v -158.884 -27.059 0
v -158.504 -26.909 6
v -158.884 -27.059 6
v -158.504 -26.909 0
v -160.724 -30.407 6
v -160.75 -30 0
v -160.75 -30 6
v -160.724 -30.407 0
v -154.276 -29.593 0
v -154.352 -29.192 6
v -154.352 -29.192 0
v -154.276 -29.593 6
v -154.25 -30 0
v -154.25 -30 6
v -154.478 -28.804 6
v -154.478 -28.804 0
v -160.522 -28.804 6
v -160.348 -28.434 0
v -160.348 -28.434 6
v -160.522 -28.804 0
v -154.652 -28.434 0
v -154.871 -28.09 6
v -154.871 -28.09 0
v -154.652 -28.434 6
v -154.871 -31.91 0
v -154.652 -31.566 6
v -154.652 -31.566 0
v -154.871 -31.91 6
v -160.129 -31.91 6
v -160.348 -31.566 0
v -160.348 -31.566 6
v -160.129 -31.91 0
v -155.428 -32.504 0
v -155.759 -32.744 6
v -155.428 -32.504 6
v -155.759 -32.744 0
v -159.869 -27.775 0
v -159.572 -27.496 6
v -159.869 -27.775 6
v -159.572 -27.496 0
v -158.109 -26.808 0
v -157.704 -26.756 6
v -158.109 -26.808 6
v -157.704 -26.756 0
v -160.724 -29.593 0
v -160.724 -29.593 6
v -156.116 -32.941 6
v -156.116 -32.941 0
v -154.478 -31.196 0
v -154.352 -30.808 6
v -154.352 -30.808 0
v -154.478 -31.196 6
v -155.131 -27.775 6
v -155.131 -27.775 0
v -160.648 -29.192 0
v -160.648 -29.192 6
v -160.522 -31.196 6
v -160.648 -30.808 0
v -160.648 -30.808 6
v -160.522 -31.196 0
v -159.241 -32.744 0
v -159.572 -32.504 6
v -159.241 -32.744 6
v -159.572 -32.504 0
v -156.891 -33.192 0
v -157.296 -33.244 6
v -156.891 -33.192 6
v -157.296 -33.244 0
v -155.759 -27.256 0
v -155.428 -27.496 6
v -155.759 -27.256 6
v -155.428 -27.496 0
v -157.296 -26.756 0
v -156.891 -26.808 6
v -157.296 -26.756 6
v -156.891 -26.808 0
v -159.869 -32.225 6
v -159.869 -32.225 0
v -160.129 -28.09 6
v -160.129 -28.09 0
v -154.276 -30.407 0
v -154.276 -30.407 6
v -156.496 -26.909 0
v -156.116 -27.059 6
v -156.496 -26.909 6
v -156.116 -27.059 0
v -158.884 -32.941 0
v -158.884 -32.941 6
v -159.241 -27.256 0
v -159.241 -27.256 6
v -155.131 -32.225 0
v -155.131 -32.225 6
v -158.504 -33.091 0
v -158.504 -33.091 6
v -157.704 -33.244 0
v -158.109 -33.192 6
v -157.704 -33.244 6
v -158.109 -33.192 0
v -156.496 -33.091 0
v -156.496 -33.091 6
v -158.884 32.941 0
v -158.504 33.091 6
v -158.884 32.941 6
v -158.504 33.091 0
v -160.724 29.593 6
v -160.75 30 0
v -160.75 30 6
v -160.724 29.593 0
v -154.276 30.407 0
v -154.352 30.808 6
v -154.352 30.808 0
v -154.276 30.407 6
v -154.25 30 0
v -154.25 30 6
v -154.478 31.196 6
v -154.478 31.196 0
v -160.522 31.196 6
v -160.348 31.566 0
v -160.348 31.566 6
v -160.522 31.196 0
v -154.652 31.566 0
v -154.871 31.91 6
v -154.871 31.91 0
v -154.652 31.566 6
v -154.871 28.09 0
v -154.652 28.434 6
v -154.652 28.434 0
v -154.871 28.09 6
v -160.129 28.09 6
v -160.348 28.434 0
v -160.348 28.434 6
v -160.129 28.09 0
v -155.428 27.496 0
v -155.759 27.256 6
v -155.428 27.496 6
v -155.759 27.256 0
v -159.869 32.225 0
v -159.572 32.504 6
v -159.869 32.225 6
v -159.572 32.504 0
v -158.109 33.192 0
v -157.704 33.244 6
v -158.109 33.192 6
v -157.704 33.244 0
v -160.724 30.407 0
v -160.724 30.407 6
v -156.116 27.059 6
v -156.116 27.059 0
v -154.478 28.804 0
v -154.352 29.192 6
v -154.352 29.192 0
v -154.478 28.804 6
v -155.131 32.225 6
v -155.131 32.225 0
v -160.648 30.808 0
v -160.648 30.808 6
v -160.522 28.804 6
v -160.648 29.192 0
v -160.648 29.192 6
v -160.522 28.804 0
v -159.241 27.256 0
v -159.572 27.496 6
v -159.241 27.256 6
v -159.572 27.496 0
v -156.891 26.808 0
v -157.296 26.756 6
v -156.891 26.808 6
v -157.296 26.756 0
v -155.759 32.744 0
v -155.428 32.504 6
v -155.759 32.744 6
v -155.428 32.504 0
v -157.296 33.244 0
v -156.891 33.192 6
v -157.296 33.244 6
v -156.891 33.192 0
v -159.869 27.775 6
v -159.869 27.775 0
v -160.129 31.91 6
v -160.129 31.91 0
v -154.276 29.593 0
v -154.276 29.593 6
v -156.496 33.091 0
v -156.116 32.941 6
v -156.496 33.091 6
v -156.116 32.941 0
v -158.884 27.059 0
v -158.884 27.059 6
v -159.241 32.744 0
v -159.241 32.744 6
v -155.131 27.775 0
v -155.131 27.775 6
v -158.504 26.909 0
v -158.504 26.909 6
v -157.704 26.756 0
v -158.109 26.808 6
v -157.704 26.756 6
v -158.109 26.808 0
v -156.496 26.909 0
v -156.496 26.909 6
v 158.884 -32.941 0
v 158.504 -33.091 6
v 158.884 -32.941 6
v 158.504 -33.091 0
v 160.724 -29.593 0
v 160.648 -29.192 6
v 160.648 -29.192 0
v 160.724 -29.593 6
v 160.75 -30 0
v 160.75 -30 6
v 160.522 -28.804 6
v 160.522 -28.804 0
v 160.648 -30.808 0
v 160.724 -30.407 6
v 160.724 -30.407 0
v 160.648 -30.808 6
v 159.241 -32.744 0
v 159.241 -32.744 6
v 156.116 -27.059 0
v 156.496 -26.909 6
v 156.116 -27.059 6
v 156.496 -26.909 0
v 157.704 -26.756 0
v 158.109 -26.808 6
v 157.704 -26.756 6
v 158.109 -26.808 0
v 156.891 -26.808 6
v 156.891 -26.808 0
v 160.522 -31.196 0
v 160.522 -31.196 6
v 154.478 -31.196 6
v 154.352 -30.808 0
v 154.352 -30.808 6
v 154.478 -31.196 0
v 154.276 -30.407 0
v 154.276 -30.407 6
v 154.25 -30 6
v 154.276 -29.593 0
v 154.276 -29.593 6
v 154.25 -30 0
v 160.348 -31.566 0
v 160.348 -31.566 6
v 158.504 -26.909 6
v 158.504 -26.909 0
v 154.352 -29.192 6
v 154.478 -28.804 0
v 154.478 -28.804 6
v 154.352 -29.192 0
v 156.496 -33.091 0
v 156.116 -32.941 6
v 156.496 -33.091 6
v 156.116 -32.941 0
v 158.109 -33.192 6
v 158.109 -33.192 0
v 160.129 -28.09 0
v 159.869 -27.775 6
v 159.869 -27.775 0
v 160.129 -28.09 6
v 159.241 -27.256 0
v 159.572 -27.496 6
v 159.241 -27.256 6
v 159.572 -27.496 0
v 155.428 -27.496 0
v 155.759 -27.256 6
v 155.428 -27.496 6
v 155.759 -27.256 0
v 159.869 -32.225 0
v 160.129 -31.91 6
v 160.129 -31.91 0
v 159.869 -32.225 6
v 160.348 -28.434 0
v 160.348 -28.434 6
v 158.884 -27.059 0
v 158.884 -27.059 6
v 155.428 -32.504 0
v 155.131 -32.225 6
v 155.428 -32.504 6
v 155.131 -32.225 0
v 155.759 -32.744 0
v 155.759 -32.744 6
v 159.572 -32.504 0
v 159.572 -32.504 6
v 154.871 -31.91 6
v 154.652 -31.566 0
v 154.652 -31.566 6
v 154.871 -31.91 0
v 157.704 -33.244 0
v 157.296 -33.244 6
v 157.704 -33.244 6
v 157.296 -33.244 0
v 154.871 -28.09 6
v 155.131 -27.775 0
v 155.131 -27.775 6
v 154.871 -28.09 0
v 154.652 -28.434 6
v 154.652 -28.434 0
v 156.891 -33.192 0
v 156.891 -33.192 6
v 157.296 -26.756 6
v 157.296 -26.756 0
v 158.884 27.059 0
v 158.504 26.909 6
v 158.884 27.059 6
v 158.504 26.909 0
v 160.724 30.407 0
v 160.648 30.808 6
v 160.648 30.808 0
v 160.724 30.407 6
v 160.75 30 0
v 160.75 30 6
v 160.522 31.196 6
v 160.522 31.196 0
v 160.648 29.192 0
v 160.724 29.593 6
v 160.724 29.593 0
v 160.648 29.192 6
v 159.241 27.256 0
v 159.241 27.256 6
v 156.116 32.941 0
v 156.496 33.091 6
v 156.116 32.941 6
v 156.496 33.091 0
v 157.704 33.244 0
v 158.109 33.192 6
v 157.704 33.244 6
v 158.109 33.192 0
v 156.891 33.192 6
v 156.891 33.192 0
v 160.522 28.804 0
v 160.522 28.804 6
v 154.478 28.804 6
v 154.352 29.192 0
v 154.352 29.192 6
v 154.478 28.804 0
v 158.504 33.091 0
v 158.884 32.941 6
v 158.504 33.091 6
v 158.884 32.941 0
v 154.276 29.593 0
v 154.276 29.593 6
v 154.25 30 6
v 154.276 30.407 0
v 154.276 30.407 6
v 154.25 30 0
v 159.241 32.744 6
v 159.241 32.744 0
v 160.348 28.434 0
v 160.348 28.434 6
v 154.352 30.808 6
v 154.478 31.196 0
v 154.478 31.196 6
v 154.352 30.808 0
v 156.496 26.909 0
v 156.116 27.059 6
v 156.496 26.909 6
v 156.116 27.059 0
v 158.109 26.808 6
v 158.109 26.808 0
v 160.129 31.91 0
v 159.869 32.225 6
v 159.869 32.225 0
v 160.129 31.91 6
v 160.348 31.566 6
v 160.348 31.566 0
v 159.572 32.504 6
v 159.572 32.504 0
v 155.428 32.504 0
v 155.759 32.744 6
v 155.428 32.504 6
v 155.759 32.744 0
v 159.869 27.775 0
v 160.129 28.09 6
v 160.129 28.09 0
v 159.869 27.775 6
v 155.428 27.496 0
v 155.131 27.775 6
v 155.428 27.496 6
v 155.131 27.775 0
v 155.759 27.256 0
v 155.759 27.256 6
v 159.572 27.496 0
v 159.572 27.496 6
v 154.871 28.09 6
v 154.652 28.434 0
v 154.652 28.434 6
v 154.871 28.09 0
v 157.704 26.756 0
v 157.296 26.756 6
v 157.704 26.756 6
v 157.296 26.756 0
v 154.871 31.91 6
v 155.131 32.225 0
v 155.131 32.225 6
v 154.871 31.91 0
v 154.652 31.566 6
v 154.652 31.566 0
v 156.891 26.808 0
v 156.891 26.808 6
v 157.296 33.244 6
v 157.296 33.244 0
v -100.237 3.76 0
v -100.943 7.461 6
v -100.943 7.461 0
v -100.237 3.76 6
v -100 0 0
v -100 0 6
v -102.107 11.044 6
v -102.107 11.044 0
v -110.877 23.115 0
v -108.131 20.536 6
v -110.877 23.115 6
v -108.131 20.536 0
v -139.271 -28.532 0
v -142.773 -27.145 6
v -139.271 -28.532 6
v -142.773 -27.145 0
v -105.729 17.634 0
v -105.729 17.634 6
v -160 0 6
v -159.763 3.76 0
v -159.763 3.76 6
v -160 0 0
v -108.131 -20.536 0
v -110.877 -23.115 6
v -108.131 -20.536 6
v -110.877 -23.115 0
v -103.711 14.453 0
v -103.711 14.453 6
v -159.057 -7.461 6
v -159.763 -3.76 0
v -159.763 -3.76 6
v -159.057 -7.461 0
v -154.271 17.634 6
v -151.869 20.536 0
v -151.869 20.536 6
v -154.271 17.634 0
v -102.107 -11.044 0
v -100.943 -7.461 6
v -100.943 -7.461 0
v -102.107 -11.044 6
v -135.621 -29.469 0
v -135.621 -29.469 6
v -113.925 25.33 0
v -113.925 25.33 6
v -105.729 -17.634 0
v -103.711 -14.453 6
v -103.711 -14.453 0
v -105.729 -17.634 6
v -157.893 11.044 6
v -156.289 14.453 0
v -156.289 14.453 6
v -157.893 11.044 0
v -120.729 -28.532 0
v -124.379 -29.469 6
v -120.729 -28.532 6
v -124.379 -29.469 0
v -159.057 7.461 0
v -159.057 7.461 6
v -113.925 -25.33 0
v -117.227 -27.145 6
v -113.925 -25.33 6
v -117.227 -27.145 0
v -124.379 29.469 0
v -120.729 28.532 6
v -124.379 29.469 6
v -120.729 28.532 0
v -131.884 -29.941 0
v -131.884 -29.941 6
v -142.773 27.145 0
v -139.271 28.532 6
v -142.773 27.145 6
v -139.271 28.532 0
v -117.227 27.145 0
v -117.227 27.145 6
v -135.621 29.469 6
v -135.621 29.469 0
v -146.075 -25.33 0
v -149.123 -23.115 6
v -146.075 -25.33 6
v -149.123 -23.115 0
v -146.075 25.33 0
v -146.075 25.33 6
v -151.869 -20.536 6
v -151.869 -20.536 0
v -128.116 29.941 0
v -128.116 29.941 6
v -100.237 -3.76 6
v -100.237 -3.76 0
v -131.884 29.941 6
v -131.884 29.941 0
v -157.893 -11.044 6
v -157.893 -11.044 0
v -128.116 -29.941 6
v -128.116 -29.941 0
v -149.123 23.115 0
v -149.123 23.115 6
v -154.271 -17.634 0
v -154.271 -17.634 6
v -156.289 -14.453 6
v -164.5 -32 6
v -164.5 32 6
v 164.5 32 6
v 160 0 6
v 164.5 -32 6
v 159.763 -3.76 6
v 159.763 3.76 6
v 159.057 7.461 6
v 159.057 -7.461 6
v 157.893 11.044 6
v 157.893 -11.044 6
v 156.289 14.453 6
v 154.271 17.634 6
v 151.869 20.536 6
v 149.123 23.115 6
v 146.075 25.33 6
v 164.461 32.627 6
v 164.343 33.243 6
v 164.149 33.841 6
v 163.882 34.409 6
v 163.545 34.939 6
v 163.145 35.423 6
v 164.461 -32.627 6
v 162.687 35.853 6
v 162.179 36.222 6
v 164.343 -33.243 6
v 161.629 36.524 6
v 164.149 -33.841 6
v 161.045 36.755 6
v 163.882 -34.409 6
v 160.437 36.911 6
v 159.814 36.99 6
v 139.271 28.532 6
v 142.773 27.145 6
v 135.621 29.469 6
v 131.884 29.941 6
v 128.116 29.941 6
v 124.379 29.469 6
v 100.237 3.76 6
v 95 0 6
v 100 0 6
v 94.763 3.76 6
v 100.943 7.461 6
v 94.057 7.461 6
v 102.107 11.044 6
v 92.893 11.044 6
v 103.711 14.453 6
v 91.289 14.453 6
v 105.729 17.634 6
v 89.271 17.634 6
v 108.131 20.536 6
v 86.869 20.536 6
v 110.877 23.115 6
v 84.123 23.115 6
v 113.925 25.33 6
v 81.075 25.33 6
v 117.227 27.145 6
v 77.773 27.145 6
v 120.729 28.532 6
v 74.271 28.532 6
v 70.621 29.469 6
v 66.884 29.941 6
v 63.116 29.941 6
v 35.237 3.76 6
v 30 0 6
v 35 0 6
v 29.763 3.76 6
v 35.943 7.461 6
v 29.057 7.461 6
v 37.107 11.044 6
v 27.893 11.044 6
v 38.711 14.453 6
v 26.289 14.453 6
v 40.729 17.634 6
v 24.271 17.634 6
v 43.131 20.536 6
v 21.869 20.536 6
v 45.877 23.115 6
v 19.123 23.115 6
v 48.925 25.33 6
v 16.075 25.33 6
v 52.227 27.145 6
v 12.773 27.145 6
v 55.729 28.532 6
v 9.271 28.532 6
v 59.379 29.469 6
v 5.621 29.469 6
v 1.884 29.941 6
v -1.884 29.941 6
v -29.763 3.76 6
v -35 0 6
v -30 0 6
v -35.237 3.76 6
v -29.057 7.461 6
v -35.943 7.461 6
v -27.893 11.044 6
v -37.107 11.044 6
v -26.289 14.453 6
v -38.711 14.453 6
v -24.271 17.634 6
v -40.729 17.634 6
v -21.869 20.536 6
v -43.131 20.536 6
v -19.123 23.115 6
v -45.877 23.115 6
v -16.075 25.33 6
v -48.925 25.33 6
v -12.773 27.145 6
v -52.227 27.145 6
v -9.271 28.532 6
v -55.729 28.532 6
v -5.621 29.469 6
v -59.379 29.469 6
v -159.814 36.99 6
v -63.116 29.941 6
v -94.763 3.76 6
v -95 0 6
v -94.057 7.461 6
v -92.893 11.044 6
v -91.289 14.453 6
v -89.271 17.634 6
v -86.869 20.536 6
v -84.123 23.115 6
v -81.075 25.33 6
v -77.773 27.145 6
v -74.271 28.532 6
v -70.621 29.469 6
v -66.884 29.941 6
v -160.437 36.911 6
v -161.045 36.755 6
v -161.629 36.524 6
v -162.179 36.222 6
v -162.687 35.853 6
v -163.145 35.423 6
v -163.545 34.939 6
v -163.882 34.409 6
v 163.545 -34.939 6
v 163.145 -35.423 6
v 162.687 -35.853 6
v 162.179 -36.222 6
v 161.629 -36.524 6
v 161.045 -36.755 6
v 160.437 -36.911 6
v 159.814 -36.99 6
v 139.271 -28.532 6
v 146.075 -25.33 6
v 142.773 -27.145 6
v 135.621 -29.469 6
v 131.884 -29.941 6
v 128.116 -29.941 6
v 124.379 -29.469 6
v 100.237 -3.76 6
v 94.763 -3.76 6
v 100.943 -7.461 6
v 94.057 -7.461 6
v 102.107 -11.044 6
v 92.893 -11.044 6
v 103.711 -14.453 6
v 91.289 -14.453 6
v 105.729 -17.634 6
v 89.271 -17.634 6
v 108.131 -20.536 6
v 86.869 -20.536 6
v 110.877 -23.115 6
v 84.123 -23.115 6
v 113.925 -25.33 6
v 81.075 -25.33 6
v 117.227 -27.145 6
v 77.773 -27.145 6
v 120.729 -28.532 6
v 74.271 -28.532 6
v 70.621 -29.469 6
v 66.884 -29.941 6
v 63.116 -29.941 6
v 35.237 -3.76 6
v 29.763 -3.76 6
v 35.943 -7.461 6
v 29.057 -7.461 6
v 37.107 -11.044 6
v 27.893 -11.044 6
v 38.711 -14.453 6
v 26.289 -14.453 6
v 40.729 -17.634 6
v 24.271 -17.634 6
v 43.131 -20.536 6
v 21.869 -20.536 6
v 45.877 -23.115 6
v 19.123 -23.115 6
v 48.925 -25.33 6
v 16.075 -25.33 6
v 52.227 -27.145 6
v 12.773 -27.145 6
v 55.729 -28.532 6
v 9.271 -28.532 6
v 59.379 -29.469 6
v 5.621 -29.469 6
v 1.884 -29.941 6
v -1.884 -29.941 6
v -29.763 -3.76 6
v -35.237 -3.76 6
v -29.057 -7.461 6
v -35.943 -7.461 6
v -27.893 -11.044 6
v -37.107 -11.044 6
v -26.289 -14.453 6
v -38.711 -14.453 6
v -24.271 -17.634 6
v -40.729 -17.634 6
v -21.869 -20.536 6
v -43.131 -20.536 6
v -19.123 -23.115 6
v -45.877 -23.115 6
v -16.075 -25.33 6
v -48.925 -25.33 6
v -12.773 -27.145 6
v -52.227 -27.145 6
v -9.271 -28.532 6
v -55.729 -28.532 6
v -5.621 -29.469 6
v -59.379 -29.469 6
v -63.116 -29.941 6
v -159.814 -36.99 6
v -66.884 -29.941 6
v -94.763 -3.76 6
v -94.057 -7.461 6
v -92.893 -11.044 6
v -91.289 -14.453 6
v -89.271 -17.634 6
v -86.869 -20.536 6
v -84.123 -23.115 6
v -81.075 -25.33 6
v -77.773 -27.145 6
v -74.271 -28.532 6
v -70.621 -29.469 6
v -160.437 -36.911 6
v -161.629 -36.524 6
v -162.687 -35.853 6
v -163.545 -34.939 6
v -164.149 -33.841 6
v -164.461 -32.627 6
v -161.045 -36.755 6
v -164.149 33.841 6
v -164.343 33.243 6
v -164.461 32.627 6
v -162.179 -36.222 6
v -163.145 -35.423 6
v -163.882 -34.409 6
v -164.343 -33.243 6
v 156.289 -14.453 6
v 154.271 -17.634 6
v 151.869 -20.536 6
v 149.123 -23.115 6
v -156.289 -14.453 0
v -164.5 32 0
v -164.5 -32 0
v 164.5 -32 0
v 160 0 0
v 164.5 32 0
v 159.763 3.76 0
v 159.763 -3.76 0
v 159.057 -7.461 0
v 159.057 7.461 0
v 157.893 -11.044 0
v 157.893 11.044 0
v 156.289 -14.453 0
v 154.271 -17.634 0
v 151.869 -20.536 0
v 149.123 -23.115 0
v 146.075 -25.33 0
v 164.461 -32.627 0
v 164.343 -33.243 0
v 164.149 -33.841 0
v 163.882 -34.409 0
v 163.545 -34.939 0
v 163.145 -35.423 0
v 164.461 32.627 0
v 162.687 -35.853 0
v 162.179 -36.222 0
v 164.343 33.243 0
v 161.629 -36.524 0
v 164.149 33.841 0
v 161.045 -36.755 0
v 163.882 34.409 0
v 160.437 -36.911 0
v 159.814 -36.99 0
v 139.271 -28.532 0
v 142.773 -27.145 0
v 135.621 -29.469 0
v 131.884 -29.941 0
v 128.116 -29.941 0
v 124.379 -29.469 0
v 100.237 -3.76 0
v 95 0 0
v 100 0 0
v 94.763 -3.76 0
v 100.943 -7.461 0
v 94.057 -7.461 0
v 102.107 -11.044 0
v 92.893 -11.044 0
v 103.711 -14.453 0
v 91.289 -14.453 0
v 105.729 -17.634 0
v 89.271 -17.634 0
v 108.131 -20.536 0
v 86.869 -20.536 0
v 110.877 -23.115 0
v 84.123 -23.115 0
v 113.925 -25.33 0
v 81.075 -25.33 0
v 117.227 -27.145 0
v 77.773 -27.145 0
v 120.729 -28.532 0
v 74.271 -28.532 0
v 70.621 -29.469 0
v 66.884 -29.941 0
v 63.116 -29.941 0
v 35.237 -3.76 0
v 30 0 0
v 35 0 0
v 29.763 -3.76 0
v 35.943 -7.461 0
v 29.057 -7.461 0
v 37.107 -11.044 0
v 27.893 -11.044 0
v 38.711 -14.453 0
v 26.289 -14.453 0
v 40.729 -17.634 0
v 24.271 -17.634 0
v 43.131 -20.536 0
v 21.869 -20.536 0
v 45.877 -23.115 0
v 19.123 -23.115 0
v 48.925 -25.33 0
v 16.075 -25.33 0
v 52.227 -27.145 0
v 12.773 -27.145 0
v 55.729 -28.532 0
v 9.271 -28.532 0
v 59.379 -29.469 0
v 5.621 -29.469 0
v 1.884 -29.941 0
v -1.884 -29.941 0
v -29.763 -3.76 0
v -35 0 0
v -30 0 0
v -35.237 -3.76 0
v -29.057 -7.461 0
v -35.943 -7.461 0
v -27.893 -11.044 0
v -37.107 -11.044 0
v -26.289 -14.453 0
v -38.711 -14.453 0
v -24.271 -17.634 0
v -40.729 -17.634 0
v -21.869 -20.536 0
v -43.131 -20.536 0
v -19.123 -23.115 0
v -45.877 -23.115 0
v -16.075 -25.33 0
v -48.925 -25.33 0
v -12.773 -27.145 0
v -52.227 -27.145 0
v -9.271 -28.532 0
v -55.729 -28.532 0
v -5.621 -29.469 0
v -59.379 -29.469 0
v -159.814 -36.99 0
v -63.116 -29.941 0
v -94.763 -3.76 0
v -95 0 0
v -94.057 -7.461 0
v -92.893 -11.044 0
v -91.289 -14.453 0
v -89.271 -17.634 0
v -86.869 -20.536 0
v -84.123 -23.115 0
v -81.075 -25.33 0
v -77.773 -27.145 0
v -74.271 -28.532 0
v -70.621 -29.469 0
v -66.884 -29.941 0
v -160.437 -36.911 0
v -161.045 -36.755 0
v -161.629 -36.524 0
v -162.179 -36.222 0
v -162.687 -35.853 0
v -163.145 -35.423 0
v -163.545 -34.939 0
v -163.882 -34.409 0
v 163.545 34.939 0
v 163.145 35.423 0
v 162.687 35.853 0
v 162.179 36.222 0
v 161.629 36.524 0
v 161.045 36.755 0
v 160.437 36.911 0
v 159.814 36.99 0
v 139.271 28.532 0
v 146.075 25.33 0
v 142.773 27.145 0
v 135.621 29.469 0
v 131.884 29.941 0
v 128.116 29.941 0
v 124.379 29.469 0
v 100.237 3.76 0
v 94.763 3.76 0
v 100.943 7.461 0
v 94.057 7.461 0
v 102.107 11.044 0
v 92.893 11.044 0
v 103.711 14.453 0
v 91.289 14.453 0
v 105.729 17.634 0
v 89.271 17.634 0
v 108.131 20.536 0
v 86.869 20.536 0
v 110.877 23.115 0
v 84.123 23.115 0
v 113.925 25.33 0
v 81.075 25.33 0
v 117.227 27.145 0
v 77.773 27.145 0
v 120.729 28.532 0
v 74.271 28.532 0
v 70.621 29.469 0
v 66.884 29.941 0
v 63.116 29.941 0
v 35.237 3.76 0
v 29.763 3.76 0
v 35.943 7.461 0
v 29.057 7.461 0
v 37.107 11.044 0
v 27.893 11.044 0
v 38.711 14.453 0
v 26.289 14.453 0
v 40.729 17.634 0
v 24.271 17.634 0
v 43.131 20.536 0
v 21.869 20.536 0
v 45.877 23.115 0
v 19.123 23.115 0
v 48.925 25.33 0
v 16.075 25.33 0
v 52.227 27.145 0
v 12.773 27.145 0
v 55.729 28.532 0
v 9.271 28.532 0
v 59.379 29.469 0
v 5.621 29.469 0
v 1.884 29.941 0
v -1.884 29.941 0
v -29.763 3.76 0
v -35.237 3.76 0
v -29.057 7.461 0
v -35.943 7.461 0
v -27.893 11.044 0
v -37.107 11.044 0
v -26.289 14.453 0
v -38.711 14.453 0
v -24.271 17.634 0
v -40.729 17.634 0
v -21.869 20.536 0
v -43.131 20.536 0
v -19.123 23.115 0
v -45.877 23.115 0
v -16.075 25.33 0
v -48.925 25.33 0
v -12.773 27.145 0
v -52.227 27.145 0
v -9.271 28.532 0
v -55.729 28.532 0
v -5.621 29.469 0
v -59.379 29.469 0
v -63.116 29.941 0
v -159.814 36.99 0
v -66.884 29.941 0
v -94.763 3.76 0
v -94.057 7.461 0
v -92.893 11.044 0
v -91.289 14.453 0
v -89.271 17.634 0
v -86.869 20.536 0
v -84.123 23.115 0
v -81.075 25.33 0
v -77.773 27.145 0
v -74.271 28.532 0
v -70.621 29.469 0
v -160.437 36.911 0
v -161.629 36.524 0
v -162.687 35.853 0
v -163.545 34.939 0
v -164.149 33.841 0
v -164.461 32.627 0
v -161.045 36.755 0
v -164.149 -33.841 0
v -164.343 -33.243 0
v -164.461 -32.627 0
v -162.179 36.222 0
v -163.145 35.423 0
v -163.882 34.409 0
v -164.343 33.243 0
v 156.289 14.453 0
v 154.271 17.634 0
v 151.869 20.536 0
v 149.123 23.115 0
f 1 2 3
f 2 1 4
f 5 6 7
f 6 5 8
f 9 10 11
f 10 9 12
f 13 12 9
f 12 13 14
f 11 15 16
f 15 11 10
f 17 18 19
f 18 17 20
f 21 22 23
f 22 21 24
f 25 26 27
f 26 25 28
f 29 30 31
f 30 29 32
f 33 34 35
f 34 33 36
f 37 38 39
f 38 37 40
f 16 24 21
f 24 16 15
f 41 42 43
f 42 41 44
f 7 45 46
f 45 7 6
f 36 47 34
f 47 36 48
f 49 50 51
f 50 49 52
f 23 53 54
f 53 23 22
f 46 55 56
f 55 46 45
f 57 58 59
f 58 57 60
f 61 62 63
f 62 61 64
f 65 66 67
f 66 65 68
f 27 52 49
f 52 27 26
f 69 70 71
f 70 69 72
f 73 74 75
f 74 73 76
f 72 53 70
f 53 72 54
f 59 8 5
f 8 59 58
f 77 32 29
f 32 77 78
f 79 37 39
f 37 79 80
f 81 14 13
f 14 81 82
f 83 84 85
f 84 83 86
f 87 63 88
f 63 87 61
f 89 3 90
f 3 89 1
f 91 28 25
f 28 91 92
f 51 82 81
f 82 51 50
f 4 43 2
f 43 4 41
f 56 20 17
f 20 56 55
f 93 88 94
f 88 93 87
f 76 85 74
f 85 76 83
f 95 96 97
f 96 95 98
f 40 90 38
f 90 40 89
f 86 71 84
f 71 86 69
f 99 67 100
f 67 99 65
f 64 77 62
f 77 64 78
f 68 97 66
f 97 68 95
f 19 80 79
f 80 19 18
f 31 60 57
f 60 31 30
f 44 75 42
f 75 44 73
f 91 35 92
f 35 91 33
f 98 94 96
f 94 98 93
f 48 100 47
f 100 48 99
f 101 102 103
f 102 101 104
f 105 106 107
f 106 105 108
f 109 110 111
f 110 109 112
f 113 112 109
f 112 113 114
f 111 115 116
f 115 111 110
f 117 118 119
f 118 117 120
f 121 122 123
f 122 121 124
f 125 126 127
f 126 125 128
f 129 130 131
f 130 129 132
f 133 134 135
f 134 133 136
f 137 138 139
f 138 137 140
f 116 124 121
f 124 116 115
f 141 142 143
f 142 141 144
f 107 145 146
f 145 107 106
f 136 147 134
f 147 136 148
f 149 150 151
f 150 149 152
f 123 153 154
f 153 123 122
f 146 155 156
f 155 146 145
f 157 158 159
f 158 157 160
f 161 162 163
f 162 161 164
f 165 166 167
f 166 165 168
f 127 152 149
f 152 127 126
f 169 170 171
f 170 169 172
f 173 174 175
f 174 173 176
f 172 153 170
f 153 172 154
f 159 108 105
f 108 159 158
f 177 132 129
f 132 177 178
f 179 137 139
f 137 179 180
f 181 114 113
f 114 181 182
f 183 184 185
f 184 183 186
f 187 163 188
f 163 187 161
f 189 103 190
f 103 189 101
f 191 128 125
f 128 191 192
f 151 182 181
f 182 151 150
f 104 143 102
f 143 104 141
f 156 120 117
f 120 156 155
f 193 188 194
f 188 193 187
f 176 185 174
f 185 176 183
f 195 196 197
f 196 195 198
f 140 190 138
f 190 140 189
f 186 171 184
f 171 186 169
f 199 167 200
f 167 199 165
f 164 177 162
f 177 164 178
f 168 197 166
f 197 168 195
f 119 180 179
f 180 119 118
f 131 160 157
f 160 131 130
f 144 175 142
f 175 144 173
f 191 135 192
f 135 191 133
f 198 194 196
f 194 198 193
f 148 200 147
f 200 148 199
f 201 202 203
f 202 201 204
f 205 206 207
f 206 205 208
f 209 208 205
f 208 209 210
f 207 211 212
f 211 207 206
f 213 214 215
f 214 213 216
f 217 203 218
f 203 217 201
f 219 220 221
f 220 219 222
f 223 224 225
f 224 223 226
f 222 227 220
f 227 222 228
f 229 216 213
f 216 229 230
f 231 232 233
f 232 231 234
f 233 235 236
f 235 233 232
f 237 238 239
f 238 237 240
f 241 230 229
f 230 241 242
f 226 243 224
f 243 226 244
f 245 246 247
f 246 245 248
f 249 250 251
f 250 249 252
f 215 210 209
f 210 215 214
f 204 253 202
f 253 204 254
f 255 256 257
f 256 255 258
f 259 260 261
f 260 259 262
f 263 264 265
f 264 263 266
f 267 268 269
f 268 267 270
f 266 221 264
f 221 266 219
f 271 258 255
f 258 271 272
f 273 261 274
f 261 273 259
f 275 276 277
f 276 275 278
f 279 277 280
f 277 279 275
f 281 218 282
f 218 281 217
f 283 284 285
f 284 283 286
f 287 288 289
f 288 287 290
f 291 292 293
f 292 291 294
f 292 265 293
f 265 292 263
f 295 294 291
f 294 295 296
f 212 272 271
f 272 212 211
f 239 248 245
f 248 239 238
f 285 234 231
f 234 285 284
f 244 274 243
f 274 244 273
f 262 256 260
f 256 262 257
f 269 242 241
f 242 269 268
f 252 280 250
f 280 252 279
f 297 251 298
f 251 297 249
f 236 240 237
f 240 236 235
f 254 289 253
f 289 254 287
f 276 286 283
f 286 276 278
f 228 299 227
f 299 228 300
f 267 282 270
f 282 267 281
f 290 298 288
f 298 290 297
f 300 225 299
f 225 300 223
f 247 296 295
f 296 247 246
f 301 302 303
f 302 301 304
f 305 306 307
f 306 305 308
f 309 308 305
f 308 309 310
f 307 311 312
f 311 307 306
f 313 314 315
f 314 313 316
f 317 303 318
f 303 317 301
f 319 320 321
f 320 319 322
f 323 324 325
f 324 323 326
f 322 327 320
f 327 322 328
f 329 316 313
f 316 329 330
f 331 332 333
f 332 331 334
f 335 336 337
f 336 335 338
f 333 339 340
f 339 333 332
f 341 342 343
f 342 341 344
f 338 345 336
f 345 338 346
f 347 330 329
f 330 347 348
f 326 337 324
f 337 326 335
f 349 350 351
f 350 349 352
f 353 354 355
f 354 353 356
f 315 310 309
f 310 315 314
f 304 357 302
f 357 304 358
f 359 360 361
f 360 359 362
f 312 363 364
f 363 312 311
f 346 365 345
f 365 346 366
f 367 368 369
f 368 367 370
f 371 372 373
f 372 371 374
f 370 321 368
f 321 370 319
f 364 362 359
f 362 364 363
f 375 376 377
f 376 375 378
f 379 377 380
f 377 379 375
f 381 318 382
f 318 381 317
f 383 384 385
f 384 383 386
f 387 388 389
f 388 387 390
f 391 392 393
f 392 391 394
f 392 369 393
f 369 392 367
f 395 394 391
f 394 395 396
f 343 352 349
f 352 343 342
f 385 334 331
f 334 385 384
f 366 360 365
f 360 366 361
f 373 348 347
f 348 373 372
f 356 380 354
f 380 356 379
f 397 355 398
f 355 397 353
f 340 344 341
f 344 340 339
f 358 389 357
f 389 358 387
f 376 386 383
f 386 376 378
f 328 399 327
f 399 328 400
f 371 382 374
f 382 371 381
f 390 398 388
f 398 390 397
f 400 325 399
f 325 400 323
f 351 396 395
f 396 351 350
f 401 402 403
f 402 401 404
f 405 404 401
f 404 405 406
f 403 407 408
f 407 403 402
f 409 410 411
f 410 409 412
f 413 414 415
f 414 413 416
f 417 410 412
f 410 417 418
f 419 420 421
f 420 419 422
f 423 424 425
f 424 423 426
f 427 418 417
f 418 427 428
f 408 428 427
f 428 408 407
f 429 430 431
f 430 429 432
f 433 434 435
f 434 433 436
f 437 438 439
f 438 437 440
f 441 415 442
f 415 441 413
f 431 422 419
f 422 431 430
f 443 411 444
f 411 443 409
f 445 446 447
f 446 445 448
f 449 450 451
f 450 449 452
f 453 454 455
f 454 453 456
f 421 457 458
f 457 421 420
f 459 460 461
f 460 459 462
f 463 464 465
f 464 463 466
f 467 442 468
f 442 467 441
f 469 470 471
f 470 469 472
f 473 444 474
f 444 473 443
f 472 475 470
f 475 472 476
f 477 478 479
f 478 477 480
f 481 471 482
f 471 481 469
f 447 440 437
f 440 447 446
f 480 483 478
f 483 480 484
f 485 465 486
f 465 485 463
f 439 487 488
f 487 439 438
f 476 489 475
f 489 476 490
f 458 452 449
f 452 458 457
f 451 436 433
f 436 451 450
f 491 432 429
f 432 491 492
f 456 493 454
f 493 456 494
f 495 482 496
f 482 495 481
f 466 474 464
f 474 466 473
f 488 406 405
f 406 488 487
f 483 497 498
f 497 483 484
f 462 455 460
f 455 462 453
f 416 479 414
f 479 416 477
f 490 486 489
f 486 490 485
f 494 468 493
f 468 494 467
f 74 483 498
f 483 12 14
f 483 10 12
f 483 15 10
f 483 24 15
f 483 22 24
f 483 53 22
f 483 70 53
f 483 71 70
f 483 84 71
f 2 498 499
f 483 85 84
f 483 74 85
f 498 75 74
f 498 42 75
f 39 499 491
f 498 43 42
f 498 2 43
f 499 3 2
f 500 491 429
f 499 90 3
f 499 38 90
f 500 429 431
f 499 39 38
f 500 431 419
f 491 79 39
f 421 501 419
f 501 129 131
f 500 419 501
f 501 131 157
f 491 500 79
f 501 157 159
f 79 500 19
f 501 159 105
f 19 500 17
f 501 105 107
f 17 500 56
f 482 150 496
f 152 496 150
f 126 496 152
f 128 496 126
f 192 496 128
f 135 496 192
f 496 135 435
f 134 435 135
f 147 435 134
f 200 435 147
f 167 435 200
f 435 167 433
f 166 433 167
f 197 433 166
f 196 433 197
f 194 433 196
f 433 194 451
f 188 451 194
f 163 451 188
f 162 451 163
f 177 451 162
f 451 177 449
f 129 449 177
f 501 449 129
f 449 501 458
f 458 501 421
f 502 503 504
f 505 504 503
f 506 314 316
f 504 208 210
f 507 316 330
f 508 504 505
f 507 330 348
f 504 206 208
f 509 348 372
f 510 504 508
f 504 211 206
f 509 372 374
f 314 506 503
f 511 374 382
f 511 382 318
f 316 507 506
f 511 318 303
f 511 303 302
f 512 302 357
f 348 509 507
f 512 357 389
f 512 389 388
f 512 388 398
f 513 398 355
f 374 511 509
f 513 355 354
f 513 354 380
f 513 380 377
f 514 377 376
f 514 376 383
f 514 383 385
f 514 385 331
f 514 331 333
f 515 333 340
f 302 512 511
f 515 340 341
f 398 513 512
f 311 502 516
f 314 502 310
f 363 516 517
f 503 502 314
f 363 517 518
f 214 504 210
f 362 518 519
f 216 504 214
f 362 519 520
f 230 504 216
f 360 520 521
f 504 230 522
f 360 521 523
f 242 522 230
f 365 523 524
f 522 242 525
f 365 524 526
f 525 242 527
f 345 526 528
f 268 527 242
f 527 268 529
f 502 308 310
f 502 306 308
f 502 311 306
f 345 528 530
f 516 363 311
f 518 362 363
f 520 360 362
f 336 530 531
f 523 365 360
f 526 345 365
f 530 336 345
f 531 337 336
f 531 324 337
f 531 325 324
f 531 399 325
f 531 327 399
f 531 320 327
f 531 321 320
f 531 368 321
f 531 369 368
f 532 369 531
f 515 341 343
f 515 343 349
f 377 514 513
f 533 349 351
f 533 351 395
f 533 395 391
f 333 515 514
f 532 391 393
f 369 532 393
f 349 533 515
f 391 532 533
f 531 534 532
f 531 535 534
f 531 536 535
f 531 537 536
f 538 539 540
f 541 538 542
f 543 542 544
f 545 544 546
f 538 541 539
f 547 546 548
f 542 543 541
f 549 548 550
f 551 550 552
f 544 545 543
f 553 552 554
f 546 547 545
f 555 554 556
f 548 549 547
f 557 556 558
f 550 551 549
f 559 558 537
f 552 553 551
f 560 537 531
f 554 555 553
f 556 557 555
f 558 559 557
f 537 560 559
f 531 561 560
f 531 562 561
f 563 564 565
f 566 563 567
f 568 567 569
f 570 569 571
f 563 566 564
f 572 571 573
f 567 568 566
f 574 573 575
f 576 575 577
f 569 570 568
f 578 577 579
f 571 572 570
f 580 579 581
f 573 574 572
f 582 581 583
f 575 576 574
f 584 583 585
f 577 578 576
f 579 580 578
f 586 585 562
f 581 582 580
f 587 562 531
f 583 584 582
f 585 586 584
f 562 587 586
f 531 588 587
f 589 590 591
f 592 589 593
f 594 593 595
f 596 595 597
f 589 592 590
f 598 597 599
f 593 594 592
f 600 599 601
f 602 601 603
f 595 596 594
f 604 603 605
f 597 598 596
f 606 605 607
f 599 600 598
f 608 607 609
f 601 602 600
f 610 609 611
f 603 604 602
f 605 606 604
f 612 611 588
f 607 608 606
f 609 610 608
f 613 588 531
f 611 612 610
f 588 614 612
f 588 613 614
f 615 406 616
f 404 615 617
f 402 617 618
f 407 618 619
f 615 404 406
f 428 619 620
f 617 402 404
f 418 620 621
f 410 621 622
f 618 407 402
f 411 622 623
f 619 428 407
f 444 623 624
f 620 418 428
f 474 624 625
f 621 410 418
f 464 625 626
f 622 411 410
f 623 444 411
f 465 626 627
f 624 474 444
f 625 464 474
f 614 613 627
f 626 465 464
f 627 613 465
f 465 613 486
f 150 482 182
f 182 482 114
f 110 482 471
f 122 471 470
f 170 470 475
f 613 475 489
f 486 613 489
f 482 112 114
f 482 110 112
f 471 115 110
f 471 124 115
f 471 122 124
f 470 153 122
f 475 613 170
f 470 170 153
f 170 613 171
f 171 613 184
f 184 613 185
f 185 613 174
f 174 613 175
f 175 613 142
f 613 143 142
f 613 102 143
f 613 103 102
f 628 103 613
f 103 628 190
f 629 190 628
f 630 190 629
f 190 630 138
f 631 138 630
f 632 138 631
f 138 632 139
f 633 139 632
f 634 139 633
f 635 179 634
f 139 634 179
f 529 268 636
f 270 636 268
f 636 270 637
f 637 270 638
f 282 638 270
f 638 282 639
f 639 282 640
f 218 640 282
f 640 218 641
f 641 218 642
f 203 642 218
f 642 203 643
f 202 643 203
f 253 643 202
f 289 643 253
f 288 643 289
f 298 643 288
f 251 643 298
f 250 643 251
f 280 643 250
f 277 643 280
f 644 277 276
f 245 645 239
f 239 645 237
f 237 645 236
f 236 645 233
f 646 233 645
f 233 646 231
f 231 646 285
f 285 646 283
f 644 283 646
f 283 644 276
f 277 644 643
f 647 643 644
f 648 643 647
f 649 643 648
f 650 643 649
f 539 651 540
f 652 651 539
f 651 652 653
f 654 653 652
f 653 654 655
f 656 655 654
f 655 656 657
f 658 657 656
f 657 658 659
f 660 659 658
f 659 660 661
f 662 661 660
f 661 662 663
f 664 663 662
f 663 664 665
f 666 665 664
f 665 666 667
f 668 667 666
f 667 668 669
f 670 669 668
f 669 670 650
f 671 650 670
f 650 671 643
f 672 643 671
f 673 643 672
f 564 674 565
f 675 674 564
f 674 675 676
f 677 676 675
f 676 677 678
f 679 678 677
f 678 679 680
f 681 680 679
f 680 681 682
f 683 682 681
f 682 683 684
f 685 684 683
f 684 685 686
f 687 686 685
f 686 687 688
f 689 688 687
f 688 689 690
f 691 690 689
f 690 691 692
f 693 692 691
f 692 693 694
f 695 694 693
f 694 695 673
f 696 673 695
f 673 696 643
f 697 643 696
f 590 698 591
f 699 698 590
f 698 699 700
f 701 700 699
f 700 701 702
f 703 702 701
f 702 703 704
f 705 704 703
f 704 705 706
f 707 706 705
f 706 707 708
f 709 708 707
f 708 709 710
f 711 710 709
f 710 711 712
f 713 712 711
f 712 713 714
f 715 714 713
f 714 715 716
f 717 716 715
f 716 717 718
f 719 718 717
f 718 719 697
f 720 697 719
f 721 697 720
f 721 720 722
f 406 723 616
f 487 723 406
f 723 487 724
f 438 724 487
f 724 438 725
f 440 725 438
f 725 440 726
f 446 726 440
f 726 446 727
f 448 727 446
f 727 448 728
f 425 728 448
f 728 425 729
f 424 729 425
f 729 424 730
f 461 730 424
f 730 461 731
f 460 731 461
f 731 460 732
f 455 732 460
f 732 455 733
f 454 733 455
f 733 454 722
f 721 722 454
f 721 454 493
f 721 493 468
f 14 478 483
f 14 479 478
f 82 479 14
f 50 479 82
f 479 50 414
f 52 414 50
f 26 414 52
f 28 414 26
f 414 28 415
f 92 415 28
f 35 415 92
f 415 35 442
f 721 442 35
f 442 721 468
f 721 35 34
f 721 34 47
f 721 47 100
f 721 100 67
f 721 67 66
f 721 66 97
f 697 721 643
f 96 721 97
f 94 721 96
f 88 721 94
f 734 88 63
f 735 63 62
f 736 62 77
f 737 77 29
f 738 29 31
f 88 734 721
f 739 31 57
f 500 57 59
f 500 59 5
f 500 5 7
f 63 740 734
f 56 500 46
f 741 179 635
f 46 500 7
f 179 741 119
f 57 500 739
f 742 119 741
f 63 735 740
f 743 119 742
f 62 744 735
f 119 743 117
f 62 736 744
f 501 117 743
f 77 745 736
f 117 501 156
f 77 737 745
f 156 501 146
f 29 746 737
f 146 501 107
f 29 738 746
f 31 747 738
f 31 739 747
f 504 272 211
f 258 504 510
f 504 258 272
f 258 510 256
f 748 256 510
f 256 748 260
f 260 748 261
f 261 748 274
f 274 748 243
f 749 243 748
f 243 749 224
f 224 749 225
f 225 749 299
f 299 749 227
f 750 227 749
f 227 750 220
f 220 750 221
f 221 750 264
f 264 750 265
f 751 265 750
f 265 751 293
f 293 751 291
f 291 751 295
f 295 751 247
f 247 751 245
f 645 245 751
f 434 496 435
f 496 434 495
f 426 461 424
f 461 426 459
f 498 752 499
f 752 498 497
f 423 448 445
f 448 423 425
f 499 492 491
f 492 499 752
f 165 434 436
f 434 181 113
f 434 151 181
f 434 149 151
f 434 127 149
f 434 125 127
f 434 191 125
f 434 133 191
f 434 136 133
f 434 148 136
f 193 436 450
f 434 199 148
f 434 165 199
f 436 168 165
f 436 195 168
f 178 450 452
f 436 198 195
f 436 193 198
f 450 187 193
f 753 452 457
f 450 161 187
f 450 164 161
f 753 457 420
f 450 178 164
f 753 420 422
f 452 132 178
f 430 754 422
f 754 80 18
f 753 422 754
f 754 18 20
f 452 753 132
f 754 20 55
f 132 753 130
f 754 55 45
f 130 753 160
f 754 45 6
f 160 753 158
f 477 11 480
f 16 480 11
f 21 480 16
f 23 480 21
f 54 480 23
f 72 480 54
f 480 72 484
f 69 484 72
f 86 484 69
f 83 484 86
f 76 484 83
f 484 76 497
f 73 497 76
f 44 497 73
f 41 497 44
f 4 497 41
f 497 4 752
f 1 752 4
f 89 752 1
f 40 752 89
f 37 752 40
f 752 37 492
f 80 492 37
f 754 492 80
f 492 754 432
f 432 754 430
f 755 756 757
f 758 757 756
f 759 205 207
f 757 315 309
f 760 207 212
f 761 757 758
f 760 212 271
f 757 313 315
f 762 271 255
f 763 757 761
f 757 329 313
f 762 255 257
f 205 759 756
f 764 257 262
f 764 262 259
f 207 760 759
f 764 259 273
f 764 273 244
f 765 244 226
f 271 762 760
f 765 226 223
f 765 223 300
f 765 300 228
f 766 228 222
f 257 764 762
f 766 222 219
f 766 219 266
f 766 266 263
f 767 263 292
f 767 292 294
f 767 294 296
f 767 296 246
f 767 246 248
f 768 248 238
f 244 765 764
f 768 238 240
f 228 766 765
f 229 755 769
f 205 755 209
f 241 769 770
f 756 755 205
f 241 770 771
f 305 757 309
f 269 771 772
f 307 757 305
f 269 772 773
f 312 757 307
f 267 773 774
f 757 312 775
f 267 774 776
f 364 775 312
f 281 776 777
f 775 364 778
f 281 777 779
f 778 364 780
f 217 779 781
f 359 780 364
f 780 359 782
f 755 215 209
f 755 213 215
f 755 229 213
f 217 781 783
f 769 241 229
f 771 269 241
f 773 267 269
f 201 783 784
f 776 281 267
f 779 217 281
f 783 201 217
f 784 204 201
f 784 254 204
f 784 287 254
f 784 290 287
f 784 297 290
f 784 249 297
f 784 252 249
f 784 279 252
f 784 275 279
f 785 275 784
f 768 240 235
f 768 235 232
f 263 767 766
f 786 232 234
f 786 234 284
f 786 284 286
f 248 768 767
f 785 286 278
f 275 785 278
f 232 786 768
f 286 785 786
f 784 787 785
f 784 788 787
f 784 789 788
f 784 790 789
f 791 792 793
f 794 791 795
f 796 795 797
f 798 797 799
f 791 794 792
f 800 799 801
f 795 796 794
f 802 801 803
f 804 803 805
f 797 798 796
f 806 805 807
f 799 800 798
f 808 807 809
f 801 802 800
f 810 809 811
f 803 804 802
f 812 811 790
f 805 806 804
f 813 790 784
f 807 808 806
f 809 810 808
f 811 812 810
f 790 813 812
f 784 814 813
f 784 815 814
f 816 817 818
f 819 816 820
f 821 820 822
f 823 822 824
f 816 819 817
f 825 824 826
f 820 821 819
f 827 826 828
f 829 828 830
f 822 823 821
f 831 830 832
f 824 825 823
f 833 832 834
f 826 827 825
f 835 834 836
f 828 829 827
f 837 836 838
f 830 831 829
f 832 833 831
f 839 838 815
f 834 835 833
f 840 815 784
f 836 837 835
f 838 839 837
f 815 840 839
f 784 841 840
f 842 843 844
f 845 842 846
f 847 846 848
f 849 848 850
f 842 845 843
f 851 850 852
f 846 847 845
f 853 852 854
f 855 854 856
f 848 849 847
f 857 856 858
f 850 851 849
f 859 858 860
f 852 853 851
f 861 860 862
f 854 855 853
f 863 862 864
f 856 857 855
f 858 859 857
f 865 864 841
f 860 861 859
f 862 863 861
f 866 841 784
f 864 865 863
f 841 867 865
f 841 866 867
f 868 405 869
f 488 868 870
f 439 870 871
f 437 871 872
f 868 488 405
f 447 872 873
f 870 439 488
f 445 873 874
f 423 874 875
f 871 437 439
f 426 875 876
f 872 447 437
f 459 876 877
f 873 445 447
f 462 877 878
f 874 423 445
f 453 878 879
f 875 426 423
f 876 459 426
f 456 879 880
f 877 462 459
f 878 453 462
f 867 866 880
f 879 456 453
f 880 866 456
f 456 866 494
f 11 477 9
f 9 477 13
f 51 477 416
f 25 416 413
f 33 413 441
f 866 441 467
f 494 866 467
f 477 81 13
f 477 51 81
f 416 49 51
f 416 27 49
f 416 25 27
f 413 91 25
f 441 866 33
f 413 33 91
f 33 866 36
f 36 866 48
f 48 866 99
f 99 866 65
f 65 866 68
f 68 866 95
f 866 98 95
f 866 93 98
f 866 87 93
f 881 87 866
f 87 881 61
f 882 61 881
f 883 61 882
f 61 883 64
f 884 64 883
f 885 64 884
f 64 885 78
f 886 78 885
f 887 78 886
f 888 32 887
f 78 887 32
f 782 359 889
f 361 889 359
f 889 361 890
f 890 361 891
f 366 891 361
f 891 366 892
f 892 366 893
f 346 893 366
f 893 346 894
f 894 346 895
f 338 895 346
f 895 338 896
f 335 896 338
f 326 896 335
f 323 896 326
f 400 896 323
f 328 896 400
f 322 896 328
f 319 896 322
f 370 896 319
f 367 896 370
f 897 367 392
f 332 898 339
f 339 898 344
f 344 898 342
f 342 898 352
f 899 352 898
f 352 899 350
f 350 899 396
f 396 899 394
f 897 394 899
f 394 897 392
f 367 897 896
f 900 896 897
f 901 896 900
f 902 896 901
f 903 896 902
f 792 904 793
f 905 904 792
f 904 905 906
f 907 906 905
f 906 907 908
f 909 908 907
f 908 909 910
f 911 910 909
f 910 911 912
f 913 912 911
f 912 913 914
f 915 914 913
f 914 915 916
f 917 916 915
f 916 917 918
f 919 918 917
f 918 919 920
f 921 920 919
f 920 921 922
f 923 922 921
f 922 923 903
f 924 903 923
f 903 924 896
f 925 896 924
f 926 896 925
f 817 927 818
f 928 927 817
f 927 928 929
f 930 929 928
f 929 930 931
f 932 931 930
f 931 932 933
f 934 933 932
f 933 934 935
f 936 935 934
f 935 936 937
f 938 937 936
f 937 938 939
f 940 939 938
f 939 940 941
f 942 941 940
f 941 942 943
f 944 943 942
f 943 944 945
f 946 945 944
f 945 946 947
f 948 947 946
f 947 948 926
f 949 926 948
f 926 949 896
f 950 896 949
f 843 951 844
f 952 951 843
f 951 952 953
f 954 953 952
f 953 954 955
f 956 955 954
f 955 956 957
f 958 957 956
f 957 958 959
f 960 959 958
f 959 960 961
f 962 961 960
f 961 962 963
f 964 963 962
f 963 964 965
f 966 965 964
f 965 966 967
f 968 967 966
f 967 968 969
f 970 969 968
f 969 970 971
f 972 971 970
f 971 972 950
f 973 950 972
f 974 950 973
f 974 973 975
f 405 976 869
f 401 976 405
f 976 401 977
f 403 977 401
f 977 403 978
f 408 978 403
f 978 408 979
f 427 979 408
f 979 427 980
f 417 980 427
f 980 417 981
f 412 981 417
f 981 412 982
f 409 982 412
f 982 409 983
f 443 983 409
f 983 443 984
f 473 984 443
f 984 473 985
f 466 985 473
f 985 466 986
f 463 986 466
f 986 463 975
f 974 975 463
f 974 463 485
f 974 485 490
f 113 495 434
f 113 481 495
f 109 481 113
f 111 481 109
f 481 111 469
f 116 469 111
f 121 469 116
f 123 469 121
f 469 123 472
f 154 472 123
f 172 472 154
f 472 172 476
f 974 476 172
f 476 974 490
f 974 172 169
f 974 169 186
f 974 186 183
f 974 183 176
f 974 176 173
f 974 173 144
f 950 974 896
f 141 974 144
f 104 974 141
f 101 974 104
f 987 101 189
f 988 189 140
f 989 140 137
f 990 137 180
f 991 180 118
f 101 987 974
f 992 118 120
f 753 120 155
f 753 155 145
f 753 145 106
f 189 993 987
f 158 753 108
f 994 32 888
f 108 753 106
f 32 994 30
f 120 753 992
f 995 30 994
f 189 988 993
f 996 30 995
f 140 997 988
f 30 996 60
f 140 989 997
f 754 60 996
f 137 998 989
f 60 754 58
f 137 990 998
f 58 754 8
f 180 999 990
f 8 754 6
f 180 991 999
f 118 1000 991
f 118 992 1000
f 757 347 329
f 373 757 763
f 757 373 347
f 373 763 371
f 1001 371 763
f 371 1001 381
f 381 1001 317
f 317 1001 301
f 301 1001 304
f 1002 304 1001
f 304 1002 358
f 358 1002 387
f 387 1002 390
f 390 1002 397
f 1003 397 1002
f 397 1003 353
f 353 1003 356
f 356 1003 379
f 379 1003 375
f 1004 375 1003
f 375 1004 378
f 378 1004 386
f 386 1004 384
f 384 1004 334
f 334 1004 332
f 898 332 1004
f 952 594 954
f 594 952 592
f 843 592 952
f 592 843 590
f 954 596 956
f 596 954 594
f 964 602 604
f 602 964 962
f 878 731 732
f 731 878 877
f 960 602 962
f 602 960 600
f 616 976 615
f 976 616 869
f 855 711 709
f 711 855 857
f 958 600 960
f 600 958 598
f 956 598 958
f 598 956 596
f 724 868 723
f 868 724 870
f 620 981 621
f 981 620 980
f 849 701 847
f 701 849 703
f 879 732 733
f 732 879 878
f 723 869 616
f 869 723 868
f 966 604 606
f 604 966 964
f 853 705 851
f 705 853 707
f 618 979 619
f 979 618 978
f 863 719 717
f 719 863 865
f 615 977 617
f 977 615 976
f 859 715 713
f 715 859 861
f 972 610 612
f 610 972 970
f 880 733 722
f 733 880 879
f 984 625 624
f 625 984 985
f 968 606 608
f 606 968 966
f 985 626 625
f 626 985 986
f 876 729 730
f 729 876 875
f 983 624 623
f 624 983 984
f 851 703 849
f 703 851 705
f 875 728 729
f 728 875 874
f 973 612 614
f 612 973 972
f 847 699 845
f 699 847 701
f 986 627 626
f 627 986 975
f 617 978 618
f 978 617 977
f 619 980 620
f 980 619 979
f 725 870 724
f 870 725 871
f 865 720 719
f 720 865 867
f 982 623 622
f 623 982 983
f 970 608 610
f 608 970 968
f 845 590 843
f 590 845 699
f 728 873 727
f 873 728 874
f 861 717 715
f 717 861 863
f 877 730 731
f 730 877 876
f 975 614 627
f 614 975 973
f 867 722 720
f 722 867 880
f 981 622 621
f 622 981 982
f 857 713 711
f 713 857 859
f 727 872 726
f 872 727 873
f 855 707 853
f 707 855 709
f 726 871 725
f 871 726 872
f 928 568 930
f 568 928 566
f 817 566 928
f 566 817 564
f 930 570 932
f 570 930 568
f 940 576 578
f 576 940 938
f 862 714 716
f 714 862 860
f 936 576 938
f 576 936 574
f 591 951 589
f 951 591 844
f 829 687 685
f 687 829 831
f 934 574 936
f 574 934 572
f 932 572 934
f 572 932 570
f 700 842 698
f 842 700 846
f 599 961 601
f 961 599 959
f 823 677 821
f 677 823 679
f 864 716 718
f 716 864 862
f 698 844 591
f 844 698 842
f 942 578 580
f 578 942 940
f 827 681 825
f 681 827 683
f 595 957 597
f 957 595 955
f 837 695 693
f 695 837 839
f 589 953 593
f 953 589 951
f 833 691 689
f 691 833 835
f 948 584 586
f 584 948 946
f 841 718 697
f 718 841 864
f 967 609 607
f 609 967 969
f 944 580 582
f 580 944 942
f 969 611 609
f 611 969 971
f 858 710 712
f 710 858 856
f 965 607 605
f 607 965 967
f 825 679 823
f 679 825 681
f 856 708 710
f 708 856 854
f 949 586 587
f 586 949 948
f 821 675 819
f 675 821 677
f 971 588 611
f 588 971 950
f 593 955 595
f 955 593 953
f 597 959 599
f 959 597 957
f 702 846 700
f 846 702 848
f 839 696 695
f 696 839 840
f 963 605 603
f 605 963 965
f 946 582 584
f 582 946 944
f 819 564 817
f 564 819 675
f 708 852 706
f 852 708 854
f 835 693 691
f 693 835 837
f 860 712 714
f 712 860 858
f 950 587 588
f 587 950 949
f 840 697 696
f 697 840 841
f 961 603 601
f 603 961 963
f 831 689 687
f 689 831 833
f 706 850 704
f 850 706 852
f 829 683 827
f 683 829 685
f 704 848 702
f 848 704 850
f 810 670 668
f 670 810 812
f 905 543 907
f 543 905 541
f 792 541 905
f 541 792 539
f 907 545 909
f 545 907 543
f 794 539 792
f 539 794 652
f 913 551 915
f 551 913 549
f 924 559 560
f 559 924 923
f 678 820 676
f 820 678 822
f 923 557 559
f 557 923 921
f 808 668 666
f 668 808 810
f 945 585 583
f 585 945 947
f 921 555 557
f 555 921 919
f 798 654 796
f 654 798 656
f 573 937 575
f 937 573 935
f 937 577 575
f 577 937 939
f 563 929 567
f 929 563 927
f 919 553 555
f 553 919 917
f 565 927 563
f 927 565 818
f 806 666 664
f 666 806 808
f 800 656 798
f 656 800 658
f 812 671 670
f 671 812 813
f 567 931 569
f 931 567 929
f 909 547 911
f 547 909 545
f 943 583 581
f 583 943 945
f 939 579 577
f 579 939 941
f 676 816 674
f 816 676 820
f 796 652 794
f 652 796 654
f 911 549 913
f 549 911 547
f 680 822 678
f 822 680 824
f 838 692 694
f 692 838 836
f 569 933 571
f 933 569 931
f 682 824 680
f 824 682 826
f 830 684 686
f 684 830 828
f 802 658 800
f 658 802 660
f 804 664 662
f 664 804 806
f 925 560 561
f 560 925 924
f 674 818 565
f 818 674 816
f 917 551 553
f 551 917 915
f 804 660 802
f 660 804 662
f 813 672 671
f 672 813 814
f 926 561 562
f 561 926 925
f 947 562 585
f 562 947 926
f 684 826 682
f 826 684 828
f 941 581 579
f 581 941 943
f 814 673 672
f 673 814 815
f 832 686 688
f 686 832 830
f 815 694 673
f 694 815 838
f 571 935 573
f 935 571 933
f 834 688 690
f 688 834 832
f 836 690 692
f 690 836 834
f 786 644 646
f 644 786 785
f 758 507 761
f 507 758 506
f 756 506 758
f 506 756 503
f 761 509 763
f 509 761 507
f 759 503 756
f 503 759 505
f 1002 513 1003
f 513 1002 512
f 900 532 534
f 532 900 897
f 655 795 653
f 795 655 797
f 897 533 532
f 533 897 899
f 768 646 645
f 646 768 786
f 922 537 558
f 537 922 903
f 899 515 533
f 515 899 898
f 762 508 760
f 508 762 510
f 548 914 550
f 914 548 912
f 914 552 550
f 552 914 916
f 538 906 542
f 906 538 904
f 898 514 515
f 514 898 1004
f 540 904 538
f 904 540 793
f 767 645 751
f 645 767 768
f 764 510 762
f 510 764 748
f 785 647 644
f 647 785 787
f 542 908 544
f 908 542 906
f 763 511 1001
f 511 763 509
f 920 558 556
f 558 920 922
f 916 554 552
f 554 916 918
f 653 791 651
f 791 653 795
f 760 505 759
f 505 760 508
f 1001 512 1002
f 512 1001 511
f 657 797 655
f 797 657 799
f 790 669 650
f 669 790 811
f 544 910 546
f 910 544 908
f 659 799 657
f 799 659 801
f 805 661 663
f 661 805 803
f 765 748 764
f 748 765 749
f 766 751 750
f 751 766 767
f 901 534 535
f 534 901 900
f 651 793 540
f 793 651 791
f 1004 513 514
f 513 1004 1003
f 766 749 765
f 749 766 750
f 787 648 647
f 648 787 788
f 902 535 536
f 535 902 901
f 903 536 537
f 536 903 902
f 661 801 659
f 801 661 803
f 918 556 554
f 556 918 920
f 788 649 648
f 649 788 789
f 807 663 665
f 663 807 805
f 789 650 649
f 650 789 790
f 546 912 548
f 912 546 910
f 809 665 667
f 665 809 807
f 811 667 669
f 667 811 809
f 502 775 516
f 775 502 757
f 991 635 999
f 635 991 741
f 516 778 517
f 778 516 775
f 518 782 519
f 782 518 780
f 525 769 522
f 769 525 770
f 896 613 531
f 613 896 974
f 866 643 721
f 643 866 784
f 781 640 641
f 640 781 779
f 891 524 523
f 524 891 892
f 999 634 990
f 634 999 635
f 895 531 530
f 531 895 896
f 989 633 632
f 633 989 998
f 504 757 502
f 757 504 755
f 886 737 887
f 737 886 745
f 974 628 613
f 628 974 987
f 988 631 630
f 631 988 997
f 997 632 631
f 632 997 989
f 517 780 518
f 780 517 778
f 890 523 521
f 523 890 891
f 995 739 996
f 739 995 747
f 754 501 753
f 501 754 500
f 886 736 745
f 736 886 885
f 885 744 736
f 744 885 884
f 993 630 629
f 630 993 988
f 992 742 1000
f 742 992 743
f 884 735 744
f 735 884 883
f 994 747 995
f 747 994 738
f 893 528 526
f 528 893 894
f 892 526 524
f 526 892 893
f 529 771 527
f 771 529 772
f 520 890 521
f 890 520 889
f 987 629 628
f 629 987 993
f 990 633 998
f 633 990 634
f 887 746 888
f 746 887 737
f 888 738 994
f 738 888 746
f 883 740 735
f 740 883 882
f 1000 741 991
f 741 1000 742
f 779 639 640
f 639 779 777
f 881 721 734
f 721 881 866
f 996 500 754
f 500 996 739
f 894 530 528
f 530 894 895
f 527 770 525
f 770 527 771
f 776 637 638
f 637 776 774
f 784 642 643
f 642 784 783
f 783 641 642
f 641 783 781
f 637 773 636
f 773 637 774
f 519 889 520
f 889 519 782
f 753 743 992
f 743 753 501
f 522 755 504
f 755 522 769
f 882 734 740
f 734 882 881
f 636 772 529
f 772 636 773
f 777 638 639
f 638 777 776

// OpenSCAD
$fn = 50;


difference() {
	union() {
		hull() {
			translate(v = [-159.5000000000, 32.0000000000, 0]) {
				cylinder(h = 6, r = 5);
			}
			translate(v = [159.5000000000, 32.0000000000, 0]) {
				cylinder(h = 6, r = 5);
			}
			translate(v = [-159.5000000000, -32.0000000000, 0]) {
				cylinder(h = 6, r = 5);
			}
			translate(v = [159.5000000000, -32.0000000000, 0]) {
				cylinder(h = 6, r = 5);
			}
		}
	}
	union() {
		#translate(v = [-157.5000000000, -30.0000000000, -100.0000000000]) {
			cylinder(h = 200, r = 3.2500000000);
		}
		#translate(v = [-157.5000000000, 30.0000000000, -100.0000000000]) {
			cylinder(h = 200, r = 3.2500000000);
		}
		#translate(v = [157.5000000000, -30.0000000000, -100.0000000000]) {
			cylinder(h = 200, r = 3.2500000000);
		}
		#translate(v = [157.5000000000, 30.0000000000, -100.0000000000]) {
			cylinder(h = 200, r = 3.2500000000);
		}
		#translate(v = [-130.0000000000, 0, 0]) {
			cylinder(h = 6, r = 30.0000000000);
		}
		#translate(v = [-65.0000000000, 0, 0]) {
			cylinder(h = 6, r = 30.0000000000);
		}
		#cylinder(h = 6, r = 30.0000000000);
		#translate(v = [65.0000000000, 0, 0]) {
			cylinder(h = 6, r = 30.0000000000);
		}
		#translate(v = [130.0000000000, 0, 0]) {
			cylinder(h = 6, r = 30.0000000000);
		}
	}
}
